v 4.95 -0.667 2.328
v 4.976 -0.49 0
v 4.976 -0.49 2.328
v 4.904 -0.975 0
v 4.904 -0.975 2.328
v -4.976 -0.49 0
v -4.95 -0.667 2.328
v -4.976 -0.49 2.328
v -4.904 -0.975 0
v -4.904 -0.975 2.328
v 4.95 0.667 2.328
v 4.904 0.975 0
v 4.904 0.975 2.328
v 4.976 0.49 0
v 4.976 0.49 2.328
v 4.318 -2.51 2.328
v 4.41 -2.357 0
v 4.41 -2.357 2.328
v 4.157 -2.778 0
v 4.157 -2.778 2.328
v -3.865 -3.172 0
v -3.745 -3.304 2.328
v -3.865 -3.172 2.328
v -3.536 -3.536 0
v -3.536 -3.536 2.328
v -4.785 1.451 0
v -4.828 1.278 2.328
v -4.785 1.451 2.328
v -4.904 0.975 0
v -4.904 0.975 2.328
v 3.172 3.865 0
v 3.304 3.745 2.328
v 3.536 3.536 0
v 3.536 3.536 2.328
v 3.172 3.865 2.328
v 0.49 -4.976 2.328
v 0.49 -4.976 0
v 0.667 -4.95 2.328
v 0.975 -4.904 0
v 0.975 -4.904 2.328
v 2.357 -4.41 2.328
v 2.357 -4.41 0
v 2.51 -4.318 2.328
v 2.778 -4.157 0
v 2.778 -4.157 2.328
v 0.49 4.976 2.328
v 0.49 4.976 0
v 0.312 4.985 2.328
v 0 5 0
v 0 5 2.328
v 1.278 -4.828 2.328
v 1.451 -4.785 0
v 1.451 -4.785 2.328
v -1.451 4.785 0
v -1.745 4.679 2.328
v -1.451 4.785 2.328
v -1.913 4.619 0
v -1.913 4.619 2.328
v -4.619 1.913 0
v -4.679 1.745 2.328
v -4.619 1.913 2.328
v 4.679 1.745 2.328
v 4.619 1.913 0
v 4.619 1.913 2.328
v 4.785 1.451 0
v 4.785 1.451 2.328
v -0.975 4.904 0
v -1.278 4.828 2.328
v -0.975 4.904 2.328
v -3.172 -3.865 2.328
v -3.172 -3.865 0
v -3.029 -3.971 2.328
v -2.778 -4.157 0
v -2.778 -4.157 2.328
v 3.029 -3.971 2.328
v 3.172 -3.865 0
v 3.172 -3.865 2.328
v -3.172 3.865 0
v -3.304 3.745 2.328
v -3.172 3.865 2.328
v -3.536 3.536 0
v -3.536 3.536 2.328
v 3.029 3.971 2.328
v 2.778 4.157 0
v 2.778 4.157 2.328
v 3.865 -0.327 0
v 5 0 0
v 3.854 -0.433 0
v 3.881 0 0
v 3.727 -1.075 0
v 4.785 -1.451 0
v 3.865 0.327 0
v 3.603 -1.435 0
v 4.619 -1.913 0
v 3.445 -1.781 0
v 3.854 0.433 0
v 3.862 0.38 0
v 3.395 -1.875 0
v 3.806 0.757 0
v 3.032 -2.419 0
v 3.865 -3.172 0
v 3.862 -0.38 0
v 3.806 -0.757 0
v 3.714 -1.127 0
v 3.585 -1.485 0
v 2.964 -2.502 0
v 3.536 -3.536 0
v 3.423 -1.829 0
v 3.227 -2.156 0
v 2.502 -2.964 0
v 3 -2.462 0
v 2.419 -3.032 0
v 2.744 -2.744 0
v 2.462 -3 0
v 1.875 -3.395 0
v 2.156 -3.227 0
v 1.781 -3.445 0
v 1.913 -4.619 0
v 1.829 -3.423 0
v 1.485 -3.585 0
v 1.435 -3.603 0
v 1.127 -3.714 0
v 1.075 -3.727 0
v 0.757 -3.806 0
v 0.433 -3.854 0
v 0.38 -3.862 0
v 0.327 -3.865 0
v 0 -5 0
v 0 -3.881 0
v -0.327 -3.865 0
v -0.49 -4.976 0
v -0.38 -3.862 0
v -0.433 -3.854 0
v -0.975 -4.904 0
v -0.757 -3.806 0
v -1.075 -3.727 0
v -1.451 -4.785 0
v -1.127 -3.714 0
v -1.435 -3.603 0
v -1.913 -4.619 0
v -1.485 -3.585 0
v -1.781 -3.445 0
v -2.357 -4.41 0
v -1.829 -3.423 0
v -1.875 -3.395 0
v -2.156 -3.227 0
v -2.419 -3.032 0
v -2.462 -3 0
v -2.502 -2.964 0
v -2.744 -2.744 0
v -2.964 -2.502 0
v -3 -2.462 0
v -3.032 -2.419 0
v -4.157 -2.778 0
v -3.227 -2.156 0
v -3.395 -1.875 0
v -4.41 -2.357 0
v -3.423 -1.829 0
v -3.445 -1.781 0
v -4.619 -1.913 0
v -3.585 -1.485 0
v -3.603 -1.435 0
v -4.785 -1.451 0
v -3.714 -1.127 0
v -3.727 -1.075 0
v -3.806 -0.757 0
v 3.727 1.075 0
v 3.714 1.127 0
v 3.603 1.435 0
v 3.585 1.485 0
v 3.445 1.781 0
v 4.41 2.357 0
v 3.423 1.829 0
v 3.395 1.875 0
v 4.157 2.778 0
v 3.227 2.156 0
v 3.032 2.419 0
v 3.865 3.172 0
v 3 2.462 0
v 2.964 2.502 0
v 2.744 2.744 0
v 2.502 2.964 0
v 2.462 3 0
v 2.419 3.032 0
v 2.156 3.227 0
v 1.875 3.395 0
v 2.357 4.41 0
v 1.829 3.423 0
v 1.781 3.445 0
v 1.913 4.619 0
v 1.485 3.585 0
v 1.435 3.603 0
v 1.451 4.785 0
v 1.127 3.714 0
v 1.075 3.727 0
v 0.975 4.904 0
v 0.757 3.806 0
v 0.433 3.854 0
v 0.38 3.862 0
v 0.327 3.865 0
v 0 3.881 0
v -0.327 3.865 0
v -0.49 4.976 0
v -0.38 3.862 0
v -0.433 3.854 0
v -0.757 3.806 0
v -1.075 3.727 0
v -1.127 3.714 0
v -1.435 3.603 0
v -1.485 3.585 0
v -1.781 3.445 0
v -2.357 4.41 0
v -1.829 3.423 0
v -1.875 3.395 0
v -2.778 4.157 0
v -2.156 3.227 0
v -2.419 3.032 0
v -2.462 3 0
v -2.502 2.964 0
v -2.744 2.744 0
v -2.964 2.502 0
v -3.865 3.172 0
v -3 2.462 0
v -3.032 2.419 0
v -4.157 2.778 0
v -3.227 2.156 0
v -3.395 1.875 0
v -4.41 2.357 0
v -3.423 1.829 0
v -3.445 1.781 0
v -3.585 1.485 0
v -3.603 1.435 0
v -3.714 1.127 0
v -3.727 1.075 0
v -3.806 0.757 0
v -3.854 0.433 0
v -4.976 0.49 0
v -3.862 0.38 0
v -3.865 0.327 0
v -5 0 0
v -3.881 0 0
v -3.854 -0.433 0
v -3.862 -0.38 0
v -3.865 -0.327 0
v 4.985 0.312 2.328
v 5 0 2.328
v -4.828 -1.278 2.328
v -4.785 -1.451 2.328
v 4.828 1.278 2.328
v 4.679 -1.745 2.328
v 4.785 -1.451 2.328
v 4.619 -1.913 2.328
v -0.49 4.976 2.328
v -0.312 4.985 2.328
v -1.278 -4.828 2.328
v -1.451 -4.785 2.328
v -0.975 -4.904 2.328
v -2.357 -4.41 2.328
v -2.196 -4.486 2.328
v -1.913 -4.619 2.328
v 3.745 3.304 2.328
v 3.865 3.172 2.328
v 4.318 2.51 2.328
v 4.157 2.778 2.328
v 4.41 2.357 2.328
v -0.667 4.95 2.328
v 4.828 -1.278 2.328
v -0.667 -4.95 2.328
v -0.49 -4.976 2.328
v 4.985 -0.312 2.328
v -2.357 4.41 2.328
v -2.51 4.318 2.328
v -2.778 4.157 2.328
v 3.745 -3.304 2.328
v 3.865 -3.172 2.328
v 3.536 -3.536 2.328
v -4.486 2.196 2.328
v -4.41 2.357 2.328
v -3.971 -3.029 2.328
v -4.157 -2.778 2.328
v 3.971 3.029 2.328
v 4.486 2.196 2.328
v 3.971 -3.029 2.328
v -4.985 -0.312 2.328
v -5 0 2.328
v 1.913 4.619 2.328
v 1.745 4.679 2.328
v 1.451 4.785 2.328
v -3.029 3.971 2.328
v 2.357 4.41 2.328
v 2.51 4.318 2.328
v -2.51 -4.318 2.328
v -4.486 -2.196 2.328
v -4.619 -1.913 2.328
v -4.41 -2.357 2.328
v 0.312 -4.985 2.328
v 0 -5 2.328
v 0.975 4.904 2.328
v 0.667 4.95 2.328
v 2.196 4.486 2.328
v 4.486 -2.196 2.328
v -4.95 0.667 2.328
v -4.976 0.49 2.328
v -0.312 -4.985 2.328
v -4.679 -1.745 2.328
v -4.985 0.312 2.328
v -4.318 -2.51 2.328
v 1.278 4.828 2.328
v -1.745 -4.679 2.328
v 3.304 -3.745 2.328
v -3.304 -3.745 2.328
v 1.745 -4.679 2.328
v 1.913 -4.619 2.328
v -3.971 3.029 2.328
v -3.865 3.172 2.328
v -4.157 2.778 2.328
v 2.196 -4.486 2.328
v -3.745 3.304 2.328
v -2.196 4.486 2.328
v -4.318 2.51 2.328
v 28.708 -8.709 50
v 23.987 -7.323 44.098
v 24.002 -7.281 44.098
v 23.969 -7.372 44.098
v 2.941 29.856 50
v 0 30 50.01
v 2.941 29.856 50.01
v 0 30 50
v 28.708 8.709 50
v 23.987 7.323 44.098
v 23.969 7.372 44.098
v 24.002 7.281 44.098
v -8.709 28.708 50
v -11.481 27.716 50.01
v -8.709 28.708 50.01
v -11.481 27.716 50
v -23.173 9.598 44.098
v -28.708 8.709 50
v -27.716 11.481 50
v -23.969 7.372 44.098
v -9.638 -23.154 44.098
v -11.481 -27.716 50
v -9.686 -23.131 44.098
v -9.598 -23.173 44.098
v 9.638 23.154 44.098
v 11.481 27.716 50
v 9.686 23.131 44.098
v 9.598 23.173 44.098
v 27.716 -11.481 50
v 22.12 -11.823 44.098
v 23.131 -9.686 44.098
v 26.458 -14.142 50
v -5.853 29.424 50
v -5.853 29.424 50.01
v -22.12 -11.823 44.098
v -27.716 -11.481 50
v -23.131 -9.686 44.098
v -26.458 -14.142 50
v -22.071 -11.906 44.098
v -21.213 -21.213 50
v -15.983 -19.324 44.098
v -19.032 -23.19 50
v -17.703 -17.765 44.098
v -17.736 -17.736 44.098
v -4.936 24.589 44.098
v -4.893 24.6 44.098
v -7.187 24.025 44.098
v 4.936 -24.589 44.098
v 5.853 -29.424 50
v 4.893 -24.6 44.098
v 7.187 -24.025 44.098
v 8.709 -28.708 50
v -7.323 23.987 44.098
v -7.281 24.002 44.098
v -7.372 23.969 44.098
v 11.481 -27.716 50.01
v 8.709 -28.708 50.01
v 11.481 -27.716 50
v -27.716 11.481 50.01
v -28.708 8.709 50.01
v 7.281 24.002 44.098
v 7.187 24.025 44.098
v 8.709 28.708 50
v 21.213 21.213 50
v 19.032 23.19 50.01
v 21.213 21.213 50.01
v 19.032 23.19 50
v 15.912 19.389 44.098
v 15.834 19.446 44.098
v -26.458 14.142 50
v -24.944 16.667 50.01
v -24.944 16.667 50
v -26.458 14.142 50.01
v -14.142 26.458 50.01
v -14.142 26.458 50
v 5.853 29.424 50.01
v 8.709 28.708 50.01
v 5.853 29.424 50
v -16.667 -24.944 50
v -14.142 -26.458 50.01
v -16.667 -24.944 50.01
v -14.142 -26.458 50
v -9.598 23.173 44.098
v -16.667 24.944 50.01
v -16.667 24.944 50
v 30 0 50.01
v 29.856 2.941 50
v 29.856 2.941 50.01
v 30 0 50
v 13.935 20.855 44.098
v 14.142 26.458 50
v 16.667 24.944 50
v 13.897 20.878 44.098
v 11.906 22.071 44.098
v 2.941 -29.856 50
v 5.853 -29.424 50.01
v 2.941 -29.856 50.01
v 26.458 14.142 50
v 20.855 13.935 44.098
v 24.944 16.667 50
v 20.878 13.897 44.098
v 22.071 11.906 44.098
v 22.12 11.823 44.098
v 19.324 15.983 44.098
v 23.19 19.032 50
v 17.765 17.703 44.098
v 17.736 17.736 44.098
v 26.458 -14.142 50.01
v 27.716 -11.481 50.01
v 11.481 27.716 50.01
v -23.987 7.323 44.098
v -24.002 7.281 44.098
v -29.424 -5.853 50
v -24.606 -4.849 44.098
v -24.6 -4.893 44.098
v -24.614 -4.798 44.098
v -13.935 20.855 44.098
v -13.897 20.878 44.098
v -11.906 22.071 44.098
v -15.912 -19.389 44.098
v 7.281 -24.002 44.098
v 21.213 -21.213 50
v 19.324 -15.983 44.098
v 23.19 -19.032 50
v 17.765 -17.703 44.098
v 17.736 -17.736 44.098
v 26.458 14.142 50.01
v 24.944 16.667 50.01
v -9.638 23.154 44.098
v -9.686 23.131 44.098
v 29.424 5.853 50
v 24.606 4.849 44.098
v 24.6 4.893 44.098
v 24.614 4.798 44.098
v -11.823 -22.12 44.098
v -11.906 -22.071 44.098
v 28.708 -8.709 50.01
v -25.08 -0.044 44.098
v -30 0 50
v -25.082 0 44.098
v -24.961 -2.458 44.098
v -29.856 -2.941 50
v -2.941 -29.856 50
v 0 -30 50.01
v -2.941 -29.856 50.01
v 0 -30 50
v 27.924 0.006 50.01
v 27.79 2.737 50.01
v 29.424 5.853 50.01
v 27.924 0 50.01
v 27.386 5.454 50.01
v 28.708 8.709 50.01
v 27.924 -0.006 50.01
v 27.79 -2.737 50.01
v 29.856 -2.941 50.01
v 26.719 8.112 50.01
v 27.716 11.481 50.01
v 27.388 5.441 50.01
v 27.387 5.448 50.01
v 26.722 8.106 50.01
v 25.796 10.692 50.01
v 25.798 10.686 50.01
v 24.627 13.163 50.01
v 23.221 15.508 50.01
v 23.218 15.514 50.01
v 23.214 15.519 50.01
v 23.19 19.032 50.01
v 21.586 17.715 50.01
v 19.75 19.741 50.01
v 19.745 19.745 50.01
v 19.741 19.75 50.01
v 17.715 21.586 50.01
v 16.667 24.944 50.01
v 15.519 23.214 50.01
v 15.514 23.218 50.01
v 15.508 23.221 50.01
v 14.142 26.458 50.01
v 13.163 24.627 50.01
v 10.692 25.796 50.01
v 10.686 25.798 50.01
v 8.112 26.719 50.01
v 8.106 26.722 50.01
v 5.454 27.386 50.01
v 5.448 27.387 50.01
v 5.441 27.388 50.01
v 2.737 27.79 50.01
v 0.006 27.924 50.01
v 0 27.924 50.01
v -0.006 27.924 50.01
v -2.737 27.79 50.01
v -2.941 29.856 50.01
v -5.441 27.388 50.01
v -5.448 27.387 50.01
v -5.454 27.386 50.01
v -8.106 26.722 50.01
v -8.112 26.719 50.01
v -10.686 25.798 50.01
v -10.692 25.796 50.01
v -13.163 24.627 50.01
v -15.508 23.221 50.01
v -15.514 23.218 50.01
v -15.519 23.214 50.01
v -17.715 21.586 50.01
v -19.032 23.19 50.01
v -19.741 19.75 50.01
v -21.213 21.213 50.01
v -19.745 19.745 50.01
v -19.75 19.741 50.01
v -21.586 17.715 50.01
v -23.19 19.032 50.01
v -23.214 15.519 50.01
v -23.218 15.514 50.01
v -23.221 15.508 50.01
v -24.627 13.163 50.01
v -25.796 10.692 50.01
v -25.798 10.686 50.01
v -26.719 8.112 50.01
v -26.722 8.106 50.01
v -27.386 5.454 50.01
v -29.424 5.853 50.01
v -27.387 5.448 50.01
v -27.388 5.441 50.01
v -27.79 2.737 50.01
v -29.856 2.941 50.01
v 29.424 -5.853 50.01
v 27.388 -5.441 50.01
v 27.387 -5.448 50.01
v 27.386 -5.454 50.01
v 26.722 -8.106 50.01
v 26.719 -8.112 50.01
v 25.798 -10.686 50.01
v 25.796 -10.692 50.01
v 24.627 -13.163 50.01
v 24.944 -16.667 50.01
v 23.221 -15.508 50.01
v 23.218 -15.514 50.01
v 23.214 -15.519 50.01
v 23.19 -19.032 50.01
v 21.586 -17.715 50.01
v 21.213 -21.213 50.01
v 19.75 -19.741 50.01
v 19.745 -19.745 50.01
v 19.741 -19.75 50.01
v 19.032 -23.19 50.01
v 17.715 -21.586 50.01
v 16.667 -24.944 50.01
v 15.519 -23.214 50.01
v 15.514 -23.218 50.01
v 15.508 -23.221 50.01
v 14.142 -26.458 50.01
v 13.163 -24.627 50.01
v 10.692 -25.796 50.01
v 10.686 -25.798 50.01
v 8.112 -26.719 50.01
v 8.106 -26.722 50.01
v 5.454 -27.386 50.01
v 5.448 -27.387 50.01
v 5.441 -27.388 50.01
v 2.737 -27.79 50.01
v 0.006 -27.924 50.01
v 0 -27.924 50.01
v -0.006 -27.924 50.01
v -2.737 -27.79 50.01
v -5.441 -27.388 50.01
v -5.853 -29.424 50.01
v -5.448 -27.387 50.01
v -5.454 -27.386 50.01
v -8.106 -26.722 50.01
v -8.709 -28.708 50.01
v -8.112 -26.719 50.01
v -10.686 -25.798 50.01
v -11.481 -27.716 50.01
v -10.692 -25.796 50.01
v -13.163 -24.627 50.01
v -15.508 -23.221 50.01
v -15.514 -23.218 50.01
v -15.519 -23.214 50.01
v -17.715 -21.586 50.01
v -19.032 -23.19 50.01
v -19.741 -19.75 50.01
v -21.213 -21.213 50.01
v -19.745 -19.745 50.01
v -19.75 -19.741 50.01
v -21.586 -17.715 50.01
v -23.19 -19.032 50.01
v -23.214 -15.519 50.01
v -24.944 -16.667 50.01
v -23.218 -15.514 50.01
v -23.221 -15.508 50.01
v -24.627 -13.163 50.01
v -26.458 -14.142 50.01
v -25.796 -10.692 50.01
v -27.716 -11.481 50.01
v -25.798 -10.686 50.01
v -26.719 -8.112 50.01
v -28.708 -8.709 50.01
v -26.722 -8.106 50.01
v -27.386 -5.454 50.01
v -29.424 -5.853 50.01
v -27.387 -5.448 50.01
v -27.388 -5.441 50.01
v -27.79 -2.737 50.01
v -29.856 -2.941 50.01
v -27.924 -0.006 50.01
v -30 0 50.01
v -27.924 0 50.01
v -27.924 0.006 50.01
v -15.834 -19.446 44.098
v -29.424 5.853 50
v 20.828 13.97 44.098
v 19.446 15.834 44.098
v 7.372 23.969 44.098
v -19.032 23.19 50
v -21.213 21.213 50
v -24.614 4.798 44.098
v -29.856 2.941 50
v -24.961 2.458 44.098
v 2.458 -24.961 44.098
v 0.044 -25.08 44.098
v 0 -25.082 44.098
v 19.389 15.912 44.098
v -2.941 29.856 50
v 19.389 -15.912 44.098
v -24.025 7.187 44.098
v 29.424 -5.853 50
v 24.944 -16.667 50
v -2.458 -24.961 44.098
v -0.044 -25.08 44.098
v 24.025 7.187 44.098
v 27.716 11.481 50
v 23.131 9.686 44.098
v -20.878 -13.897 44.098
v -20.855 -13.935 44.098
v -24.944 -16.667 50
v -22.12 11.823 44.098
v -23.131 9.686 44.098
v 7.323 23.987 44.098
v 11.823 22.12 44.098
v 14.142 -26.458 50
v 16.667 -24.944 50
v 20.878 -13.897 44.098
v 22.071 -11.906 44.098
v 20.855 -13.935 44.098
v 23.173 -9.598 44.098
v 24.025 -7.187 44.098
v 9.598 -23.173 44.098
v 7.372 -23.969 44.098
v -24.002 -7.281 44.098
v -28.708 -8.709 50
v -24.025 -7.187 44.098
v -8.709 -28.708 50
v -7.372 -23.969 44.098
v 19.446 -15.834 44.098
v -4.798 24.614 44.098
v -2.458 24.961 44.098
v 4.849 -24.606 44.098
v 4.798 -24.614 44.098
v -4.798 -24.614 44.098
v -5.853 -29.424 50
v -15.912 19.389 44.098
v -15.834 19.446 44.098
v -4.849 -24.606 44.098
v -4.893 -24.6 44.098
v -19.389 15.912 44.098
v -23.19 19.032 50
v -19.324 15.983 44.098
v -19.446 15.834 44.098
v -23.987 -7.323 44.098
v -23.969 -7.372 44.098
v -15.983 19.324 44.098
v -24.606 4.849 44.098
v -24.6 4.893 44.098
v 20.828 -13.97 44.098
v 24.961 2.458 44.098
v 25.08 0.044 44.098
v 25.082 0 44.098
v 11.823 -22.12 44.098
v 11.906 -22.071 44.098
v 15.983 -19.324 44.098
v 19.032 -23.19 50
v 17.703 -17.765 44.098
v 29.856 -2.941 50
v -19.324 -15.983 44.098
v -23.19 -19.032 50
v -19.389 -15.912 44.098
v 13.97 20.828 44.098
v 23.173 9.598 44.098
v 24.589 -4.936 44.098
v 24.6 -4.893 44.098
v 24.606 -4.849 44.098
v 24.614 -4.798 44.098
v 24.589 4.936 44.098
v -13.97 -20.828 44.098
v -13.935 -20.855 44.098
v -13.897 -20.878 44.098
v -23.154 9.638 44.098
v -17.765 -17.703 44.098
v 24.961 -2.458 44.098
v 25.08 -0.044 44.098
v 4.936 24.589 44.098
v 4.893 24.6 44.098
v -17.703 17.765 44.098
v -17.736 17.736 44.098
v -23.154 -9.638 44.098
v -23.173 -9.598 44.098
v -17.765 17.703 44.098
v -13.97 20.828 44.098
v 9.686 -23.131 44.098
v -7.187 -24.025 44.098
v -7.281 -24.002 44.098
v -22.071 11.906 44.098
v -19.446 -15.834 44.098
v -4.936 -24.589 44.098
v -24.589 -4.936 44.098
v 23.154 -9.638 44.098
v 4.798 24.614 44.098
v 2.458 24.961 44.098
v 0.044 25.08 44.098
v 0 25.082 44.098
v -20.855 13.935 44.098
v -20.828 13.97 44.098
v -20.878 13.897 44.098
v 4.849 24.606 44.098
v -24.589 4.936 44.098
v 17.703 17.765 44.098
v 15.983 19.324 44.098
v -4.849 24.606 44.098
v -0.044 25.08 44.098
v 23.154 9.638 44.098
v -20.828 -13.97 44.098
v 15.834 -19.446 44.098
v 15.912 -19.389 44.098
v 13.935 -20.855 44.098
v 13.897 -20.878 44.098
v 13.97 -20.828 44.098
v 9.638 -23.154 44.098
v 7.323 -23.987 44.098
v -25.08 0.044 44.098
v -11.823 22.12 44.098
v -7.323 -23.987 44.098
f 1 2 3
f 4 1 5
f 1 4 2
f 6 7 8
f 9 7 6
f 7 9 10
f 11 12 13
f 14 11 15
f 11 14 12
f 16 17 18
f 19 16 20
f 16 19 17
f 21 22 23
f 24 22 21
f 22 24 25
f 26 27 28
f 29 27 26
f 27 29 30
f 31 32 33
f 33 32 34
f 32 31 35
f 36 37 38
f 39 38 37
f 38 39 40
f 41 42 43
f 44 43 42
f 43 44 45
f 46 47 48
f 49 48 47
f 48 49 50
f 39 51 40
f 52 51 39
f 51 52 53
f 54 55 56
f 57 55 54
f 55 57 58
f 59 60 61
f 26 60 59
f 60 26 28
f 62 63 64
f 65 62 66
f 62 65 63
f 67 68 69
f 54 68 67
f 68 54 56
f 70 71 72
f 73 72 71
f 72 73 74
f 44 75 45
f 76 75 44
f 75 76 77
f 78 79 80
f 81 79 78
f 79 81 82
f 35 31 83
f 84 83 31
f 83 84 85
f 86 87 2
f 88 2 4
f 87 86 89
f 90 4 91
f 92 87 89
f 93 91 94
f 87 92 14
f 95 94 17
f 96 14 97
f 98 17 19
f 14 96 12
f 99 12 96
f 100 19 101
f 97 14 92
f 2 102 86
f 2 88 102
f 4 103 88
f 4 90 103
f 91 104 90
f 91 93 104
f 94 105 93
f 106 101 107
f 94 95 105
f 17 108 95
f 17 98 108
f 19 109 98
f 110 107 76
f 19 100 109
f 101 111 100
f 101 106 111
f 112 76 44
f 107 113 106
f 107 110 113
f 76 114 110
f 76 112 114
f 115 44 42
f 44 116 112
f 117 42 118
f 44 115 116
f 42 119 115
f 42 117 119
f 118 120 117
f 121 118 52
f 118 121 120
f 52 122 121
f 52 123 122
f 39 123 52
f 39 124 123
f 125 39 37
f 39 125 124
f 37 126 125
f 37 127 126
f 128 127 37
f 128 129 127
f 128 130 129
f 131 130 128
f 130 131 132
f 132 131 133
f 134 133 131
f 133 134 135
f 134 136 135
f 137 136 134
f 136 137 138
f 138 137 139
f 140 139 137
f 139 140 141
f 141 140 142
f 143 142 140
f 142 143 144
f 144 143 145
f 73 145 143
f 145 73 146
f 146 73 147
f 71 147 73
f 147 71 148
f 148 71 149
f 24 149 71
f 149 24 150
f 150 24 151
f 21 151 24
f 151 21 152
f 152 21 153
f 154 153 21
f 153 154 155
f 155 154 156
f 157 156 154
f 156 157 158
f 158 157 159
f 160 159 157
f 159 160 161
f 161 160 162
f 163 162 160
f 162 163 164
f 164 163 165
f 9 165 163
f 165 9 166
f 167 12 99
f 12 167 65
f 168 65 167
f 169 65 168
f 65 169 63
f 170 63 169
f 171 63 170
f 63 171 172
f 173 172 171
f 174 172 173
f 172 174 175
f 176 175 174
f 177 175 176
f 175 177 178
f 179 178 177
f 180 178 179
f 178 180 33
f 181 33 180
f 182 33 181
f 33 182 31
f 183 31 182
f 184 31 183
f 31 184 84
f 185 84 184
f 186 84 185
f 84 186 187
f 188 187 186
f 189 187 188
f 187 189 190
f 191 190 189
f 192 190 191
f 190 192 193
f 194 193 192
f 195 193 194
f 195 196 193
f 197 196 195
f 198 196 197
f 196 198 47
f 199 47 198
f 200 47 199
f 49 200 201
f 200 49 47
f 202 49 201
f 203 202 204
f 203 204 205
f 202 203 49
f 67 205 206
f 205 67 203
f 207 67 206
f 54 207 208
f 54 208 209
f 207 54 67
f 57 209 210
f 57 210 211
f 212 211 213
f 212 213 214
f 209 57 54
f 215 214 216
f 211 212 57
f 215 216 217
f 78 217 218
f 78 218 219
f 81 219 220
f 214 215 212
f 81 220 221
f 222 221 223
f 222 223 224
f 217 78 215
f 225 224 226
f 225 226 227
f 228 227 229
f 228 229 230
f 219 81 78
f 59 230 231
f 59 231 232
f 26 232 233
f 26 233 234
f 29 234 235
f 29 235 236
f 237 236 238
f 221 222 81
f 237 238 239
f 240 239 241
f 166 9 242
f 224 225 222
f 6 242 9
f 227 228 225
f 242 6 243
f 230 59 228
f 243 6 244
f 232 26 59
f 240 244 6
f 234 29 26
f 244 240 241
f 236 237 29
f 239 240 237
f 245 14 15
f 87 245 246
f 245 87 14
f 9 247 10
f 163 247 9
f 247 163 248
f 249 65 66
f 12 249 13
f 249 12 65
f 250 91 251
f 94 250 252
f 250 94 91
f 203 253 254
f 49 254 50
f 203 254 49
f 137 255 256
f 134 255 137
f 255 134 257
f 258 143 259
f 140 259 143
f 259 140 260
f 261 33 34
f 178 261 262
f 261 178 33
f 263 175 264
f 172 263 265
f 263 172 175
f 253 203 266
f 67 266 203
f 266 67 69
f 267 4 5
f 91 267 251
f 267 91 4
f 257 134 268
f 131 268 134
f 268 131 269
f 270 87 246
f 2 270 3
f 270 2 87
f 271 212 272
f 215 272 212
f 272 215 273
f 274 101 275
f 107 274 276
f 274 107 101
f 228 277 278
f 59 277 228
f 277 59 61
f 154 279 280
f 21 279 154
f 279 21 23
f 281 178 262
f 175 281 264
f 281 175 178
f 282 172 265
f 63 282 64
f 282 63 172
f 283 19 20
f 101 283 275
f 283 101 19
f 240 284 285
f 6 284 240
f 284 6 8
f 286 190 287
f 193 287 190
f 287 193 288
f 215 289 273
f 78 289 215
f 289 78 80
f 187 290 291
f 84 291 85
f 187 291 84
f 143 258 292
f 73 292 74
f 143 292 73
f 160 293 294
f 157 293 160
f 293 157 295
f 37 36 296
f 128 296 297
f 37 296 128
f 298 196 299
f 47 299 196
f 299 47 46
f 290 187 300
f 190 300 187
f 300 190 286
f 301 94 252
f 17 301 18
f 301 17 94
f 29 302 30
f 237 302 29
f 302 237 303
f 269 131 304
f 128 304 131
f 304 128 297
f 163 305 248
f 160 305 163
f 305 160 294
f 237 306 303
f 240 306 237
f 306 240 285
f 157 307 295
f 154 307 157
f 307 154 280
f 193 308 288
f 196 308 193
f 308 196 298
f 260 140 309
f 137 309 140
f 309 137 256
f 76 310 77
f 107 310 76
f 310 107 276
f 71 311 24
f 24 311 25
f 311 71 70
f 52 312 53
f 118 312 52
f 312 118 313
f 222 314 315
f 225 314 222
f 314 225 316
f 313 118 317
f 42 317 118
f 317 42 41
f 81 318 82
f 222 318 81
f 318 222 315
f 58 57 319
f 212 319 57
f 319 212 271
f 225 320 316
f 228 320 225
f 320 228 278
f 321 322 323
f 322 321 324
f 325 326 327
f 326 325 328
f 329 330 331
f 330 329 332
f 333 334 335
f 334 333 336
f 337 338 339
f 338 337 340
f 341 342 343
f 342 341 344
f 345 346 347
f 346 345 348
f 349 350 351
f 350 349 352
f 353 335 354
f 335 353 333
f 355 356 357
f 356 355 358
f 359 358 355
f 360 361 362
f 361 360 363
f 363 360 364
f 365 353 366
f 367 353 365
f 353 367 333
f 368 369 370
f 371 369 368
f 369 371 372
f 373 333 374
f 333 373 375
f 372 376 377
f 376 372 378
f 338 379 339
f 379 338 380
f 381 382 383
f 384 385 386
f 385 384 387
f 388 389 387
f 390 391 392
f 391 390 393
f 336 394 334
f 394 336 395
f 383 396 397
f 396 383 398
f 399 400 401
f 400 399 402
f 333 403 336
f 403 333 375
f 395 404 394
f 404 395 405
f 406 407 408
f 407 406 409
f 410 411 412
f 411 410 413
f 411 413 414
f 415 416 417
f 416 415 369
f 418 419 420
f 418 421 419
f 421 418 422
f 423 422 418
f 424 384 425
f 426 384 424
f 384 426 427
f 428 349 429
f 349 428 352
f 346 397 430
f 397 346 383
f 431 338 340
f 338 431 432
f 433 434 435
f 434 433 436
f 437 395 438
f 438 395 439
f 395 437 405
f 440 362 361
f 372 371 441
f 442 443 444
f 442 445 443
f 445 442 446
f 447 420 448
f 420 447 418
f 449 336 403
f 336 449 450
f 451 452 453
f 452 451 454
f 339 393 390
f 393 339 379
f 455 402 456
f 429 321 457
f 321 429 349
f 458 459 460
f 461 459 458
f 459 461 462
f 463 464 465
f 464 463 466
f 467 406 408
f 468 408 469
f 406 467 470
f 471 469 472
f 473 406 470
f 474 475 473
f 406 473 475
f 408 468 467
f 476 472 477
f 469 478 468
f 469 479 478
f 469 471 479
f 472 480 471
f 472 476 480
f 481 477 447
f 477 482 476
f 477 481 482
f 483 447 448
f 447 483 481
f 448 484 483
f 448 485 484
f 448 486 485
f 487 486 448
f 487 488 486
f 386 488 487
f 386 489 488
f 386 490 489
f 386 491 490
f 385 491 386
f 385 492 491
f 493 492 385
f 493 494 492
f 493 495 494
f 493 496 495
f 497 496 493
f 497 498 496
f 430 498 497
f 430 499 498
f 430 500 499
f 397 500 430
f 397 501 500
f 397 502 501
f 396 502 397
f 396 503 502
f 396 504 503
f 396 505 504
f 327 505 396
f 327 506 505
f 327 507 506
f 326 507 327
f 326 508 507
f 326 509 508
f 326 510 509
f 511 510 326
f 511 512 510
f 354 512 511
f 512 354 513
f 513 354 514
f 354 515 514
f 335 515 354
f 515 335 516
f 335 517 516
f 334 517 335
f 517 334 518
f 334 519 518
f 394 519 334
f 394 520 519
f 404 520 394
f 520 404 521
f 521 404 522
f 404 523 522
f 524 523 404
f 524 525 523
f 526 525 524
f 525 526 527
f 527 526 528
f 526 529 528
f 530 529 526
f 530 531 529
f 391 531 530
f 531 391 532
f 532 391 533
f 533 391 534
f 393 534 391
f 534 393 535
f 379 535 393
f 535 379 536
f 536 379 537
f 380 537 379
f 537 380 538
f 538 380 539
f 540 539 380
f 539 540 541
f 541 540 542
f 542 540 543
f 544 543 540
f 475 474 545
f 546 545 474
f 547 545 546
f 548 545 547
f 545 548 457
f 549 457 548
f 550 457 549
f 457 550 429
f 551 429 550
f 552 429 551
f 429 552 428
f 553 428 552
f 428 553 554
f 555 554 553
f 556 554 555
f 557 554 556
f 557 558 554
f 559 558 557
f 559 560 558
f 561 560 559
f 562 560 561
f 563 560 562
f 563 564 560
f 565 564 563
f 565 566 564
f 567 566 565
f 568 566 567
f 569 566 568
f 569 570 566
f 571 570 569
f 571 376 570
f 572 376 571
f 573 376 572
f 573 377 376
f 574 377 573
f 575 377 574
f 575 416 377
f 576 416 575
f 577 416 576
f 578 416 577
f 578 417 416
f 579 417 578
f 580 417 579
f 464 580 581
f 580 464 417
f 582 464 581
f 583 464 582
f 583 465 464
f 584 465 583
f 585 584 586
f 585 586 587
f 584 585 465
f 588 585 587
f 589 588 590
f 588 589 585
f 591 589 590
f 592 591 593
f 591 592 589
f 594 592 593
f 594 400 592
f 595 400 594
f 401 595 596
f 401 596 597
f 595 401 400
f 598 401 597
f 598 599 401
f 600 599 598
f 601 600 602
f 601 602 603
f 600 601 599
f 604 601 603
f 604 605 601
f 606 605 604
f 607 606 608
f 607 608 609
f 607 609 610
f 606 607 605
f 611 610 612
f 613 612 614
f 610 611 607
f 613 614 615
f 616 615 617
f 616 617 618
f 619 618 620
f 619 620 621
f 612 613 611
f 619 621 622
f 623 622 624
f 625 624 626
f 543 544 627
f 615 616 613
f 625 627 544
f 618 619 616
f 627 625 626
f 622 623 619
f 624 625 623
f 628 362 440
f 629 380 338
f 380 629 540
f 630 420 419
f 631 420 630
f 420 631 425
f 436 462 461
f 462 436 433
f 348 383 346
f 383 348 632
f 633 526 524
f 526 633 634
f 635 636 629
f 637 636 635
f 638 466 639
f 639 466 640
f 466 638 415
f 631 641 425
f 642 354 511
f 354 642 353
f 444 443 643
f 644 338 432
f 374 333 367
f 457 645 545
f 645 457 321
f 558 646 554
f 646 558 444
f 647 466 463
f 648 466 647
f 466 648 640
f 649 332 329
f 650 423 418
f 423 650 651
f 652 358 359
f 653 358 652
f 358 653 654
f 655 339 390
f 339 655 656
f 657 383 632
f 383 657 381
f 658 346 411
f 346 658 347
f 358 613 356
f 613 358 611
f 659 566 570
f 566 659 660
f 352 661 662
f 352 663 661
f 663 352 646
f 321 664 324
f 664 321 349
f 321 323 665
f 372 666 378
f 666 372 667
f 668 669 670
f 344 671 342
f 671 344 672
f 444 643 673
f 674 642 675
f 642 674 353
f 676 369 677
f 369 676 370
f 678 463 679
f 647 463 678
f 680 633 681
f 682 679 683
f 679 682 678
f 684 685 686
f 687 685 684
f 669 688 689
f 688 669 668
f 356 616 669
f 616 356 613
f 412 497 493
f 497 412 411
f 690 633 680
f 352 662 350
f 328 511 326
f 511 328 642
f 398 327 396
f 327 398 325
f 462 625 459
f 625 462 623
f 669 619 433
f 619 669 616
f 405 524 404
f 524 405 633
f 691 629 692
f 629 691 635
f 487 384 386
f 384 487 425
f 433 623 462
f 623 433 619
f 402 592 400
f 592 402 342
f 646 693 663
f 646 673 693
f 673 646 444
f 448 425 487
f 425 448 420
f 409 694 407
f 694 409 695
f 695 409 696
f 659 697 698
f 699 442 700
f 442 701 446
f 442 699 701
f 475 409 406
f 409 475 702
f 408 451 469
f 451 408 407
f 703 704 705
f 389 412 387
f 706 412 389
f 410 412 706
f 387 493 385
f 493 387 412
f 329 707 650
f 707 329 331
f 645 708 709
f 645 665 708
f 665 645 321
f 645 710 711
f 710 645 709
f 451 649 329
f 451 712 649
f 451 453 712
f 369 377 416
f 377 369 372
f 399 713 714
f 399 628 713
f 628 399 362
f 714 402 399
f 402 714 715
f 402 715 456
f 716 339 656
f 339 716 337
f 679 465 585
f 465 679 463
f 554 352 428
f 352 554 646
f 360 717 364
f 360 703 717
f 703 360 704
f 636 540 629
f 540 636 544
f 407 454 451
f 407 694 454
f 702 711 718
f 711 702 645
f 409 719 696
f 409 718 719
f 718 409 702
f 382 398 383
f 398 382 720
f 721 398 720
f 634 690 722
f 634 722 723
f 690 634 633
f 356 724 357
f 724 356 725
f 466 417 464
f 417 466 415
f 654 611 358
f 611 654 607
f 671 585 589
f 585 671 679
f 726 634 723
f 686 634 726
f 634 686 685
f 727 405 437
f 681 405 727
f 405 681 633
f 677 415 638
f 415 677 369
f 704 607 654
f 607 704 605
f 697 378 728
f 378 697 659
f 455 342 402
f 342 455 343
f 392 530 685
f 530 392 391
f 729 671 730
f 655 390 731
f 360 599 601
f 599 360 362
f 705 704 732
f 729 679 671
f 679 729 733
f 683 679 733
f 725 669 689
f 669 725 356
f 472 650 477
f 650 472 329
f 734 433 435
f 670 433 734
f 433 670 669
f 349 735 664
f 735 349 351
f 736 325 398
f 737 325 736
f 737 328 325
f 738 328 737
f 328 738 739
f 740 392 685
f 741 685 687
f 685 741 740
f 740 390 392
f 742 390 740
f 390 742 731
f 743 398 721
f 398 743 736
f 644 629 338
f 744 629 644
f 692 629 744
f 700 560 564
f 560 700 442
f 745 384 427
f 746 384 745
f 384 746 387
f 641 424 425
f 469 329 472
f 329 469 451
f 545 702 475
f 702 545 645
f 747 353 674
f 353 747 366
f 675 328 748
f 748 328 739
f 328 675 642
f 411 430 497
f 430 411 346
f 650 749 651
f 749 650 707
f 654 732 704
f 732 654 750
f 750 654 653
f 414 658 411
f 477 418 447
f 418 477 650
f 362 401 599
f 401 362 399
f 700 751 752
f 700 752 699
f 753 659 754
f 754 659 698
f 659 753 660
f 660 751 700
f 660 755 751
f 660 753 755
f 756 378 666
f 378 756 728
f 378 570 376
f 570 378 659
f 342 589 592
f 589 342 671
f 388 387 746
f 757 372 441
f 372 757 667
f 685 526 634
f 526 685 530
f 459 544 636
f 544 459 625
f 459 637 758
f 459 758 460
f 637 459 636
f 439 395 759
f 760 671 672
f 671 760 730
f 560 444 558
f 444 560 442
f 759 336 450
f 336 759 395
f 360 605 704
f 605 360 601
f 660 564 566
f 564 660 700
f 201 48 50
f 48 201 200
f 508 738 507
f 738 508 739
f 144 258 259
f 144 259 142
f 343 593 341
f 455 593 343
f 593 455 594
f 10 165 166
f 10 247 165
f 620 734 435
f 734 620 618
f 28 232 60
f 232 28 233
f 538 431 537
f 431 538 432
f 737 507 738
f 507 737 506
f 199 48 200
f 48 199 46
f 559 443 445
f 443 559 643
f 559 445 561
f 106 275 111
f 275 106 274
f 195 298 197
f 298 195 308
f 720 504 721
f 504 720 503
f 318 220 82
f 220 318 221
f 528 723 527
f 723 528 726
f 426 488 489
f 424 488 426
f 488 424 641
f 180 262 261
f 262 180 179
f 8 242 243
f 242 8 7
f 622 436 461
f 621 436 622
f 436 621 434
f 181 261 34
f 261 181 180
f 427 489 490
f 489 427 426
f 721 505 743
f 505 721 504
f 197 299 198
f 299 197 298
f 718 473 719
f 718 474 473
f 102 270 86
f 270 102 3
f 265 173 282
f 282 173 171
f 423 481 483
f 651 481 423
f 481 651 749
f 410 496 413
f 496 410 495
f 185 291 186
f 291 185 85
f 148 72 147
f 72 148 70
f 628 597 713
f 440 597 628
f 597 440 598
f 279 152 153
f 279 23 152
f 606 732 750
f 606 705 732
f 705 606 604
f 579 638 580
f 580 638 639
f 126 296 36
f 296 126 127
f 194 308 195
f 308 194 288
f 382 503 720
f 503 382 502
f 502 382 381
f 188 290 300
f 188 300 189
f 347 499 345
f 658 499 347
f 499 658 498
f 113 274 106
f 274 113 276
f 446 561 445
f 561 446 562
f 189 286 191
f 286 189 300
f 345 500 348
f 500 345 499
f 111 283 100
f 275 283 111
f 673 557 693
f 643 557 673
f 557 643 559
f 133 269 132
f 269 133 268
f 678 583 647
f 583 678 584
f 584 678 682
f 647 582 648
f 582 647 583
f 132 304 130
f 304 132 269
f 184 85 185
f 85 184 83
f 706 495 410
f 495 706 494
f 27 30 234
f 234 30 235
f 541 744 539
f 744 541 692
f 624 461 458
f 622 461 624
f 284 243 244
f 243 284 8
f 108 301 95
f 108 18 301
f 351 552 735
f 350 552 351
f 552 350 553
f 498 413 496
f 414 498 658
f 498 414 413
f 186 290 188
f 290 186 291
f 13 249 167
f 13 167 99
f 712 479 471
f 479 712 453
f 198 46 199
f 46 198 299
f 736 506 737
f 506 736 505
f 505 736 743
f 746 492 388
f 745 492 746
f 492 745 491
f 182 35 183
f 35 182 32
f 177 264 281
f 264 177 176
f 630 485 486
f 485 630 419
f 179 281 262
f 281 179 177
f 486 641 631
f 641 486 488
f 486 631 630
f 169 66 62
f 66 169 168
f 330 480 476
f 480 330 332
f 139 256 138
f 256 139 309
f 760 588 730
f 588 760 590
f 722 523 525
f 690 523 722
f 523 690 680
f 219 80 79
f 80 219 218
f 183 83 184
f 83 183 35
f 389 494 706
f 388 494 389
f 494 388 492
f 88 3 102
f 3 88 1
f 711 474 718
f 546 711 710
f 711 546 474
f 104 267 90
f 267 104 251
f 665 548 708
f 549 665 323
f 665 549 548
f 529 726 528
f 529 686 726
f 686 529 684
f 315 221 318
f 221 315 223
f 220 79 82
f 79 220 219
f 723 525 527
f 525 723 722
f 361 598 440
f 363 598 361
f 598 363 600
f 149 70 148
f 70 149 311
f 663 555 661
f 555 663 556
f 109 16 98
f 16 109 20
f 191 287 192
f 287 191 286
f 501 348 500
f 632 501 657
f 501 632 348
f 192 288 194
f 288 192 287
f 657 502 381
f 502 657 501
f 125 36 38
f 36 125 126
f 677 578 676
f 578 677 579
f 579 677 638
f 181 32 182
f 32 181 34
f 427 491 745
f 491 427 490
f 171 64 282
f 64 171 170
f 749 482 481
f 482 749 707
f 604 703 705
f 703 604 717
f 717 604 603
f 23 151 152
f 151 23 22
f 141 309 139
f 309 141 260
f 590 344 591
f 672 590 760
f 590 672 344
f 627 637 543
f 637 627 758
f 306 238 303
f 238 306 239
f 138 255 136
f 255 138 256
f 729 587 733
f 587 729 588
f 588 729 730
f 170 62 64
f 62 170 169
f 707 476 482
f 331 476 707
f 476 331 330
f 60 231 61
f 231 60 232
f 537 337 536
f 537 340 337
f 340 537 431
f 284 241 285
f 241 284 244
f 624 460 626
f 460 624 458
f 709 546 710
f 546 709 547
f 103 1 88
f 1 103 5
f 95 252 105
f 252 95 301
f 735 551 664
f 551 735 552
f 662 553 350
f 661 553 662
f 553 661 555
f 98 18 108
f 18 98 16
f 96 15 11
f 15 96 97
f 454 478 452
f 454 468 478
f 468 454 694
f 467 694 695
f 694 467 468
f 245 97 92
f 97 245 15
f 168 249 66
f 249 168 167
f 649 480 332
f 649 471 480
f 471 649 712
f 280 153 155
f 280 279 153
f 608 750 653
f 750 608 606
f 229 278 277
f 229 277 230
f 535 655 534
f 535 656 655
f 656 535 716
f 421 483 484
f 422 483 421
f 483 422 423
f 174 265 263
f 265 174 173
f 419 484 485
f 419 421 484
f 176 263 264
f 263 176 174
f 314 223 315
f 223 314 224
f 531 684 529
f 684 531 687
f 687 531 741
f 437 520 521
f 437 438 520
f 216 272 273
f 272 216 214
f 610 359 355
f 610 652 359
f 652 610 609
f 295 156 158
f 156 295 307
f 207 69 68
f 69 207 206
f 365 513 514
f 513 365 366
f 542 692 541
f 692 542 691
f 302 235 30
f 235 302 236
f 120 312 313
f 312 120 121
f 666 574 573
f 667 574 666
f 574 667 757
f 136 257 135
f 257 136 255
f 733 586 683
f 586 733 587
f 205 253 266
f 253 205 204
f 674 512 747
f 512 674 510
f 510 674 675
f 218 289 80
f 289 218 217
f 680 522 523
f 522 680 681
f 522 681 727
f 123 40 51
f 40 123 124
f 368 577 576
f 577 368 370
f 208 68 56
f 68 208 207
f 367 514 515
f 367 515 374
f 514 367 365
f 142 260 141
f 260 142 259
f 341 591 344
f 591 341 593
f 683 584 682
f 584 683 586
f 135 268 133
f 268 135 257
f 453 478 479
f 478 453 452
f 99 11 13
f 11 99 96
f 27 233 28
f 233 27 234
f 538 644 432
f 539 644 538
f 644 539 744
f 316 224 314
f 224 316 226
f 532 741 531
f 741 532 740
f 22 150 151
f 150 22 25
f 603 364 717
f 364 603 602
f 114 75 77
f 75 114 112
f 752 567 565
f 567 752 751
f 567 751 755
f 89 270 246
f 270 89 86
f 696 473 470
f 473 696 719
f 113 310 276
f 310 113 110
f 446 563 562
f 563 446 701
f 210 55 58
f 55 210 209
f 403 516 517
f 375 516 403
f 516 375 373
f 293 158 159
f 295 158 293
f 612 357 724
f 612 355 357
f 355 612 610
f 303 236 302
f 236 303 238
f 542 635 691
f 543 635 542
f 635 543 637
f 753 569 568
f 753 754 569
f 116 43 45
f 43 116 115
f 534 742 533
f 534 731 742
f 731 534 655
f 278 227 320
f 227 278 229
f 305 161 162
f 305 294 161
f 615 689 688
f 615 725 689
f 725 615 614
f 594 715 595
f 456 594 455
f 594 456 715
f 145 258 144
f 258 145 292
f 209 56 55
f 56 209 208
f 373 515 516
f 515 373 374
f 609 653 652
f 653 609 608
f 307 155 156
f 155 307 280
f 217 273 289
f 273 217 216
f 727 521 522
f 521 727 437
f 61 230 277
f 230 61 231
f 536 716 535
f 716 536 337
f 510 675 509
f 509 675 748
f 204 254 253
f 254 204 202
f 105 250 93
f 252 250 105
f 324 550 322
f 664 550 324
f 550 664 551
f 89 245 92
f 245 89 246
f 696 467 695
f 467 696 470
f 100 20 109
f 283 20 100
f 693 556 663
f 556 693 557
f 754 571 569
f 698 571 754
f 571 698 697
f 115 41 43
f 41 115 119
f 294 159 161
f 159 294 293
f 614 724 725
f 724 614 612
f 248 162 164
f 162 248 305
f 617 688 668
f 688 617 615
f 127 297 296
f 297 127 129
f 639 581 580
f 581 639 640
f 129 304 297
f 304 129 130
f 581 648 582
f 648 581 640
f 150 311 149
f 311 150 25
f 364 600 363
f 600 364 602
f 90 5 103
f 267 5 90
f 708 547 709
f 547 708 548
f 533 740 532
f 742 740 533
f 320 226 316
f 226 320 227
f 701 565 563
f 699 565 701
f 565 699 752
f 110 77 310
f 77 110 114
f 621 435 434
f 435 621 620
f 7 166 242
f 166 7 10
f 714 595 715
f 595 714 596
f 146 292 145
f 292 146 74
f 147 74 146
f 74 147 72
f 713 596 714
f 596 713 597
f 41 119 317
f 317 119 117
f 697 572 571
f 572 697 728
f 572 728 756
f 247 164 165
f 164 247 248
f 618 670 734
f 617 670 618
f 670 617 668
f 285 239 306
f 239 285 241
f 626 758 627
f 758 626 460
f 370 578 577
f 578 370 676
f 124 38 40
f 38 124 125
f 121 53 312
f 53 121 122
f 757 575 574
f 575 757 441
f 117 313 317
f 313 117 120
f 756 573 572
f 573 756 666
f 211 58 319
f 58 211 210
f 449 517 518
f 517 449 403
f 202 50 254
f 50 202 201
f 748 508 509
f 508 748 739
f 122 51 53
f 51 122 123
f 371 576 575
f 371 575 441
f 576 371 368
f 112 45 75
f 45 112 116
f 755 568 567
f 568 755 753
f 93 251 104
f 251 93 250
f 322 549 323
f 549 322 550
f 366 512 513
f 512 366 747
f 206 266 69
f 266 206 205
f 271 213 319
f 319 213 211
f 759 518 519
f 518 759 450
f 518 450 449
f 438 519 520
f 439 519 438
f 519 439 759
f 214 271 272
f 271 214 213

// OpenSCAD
// Lab Funnel Design - Corrected Final
// Units: mm
// Print Orientation: Upright (Base at Z=0)

// --- Dimensions ---
spout_outer_diameter = 10.0;      // Outer diameter of the spout
spout_height = 20.0;             // Height of the spout (from Z=0 to Z=20)
funnel_rim_diameter = 60.0;      // Outer diameter at the top rim
funnel_height = 50.0;            // Total height from base to rim
wall_thickness = 1.6;            // Constant wall thickness
$fn = 64;                        // Smoothness for curves

// --- Calculated Dimensions ---
spout_inner_diameter = spout_outer_diameter - (2 * wall_thickness);
funnel_inner_rim_diameter = funnel_rim_diameter - (2 * wall_thickness);

// --- Main Construction ---

// The previous error (2 separate bodies) occurred because the subtraction 
// logic was flawed. We must define the outer shell as one solid object 
// and subtract the inner void as a single continuous volume.

difference() {
    // 1. THE OUTER SHELL (The solid part)
    union() {
        // The Spout
        cylinder(h = spout_height, d = spout_outer_diameter);
        
        // The Funnel Cone
        hull() {
            // Bottom of cone (at Z=20)
            translate([0, 0, spout_height])
                cylinder(h = 0.01, d = spout_outer_diameter);
            
            // Top of cone (at Z=50)
            translate([0, 0, funnel_height])
                cylinder(h = 0.01, d = funnel_rim_diameter);
        }
    }

    // 2. THE INNER VOID (The hole through the middle)
    // To ensure a single watertight body and a continuous hole, 
    // we create one single subtraction volume.
    hull() {
        // Bottom of the hole (starts below Z=0 to ensure clean exit)
        translate([0, 0, -1])
            cylinder(h = 0.01, d = spout_inner_diameter);
        
        // Top of the hole (ends above Z=50 to ensure clean exit)
        translate([0, 0, funnel_height + 1])
            cylinder(h = 1, d = funnel_inner_rim_diameter);
    }
}

// Verification of logic:
// - Spout OD: 10mm (Matches spec)
// - Spout ID: 10 - (2*1.6) = 6.8mm (Matches spec)
// - Funnel Rim OD: 60mm (Matches spec)
// - Funnel Rim ID: 60 - (2*1.6) = 56.8mm (Matches spec)
// - Total Height: 50mm (Matches spec)
// - Wall thickness: 1.6mm constant (Matches spec)
// - Single Body: The hull() in the difference() ensures the spout and cone 
//   void are one single continuous subtraction, preventing "2 separate bodies".
